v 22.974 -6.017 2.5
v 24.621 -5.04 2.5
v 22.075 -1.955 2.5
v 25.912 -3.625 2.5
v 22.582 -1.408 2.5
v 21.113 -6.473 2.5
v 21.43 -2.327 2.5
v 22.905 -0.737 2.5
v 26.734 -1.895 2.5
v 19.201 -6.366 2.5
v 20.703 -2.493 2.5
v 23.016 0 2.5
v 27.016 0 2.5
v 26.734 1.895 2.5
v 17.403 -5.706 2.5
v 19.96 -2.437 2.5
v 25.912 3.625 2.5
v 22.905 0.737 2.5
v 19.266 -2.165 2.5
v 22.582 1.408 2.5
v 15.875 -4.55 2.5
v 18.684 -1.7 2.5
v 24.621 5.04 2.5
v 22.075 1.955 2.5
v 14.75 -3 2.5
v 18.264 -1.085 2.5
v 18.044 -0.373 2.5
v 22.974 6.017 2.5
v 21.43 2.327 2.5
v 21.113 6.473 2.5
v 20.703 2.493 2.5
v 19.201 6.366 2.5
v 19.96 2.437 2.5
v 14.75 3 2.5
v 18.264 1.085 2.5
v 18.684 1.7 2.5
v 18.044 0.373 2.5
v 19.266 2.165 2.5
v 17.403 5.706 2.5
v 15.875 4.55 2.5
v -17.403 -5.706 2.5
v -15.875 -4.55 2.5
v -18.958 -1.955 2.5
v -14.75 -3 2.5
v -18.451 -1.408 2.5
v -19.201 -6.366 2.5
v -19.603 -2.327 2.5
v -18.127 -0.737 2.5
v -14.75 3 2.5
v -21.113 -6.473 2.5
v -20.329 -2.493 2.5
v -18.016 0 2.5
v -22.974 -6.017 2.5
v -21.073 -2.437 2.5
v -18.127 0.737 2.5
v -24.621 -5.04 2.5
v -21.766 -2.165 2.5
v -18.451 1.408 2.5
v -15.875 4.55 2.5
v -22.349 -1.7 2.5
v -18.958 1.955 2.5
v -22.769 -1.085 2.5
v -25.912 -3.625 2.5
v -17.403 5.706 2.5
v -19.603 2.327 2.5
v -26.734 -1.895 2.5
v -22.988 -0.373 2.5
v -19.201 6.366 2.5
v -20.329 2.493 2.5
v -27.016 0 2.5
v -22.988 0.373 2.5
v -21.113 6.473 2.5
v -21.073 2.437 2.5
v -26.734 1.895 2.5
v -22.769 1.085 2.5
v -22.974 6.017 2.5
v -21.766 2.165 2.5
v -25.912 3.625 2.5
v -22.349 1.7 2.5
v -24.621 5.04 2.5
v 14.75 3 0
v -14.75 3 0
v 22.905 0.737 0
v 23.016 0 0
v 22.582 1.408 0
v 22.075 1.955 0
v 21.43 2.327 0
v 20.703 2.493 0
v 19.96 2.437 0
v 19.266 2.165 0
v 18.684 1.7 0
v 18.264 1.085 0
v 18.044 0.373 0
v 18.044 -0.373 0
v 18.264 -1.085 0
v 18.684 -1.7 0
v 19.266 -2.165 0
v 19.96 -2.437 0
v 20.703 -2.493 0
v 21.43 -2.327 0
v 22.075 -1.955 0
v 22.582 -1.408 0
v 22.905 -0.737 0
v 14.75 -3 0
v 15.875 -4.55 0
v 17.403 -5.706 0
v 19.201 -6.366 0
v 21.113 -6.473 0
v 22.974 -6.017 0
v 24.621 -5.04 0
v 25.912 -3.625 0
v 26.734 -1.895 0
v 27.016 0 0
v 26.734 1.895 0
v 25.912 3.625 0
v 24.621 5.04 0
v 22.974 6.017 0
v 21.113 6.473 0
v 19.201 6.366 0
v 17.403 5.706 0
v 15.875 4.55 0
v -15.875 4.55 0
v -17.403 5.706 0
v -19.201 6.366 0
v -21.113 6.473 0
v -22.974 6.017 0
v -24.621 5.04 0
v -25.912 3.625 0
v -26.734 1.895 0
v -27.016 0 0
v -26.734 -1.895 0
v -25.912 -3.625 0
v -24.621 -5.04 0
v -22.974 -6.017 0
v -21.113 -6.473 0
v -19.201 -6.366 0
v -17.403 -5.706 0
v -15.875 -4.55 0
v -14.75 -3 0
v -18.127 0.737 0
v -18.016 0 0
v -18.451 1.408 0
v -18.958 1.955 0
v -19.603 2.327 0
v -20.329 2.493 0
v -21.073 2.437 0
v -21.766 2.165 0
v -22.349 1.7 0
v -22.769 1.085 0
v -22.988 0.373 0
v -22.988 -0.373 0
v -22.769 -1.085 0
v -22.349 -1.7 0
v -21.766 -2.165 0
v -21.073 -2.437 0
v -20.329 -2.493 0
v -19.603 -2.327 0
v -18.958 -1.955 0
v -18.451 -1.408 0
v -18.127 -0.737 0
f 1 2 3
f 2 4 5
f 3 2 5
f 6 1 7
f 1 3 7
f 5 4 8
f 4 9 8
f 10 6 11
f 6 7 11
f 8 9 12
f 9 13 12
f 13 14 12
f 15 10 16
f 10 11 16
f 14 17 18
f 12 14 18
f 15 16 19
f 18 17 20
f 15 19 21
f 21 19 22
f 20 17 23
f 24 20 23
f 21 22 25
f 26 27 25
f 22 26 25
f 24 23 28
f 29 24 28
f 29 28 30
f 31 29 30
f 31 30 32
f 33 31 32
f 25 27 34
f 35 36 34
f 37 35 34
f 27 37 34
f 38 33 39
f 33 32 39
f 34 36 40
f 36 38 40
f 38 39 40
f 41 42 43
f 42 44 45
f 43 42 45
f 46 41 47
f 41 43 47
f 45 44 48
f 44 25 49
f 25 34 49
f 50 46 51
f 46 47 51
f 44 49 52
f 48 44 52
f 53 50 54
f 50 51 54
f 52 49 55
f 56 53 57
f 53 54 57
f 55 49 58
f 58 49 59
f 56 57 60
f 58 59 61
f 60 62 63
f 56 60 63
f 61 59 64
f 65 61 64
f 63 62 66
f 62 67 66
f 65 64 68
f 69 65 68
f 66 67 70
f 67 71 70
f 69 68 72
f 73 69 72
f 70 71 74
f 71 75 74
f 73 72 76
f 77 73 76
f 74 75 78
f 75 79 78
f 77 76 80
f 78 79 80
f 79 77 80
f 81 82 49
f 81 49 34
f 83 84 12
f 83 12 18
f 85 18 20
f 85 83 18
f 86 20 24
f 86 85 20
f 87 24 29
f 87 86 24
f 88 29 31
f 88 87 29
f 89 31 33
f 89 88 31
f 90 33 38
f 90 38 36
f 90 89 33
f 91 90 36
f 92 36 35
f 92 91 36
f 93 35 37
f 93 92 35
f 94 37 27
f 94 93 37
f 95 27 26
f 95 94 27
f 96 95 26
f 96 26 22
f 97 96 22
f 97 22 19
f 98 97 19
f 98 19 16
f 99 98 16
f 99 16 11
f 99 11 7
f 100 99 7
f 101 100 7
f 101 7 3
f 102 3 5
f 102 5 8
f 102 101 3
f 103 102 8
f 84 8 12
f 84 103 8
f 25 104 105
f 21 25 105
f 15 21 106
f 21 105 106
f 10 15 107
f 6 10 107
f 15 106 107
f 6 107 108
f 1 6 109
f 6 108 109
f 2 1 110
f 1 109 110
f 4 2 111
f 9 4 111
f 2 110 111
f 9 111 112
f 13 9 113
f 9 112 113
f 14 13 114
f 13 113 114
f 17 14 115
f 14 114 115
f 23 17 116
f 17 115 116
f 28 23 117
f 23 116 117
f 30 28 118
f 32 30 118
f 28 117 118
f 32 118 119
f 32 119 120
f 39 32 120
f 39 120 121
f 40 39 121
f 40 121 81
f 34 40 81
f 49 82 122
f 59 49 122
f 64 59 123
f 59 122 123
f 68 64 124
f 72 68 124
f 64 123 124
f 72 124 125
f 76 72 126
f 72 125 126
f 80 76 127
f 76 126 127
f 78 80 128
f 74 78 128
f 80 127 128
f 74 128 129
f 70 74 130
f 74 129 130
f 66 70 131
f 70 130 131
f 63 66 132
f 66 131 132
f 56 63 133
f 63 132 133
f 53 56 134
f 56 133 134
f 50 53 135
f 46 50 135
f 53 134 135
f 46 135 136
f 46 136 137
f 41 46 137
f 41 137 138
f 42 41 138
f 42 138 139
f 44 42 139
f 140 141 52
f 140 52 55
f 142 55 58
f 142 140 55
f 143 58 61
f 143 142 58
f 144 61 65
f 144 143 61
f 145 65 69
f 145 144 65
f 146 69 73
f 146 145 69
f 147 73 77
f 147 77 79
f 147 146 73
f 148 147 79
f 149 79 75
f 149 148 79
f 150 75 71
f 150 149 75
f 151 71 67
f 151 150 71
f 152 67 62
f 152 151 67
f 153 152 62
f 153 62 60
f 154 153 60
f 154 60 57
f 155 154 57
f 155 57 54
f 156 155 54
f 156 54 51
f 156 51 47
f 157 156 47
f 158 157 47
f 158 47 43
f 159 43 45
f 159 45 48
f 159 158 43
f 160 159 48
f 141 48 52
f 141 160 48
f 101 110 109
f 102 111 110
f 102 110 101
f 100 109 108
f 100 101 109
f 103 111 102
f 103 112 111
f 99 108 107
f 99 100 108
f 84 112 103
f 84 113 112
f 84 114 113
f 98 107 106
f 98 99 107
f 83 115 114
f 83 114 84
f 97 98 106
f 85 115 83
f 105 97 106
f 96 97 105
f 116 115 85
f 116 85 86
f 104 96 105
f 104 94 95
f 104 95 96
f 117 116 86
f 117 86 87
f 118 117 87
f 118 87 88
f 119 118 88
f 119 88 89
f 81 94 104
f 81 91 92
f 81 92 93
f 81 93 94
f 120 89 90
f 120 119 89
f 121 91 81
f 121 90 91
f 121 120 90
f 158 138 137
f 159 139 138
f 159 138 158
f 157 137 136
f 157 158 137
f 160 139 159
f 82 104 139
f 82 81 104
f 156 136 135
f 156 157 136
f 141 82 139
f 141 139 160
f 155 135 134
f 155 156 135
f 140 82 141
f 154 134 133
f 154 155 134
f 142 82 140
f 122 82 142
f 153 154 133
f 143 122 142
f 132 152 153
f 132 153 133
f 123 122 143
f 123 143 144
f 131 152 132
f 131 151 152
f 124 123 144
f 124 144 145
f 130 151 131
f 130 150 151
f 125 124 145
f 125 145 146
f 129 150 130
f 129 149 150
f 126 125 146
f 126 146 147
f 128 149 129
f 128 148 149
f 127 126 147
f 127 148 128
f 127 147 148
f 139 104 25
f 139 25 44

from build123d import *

# Parameters (mm, degrees)
SKETCH_R  = 2.5
PAD_DEPTH = 2.5


with BuildPart() as part:
    # Sketch → Pad (new body)
    with BuildSketch(Plane.XY):
        with BuildLine():
            Line((-14.75, 3), (14.75, 3))
            ThreePointArc((14.75, -3), (27.016281, 0), (14.75, 3))
            Line((14.75, -3), (-14.75, -3))
            ThreePointArc((-14.75, 3), (-27.016281, 0), (-14.75, -3))
        make_face()
        with Locations((-20.516281, 0)):
            Circle(SKETCH_R, mode=Mode.SUBTRACT)
        with Locations((20.516281, 0)):
            Circle(SKETCH_R, mode=Mode.SUBTRACT)
    extrude(amount=PAD_DEPTH)


solid = part.part
